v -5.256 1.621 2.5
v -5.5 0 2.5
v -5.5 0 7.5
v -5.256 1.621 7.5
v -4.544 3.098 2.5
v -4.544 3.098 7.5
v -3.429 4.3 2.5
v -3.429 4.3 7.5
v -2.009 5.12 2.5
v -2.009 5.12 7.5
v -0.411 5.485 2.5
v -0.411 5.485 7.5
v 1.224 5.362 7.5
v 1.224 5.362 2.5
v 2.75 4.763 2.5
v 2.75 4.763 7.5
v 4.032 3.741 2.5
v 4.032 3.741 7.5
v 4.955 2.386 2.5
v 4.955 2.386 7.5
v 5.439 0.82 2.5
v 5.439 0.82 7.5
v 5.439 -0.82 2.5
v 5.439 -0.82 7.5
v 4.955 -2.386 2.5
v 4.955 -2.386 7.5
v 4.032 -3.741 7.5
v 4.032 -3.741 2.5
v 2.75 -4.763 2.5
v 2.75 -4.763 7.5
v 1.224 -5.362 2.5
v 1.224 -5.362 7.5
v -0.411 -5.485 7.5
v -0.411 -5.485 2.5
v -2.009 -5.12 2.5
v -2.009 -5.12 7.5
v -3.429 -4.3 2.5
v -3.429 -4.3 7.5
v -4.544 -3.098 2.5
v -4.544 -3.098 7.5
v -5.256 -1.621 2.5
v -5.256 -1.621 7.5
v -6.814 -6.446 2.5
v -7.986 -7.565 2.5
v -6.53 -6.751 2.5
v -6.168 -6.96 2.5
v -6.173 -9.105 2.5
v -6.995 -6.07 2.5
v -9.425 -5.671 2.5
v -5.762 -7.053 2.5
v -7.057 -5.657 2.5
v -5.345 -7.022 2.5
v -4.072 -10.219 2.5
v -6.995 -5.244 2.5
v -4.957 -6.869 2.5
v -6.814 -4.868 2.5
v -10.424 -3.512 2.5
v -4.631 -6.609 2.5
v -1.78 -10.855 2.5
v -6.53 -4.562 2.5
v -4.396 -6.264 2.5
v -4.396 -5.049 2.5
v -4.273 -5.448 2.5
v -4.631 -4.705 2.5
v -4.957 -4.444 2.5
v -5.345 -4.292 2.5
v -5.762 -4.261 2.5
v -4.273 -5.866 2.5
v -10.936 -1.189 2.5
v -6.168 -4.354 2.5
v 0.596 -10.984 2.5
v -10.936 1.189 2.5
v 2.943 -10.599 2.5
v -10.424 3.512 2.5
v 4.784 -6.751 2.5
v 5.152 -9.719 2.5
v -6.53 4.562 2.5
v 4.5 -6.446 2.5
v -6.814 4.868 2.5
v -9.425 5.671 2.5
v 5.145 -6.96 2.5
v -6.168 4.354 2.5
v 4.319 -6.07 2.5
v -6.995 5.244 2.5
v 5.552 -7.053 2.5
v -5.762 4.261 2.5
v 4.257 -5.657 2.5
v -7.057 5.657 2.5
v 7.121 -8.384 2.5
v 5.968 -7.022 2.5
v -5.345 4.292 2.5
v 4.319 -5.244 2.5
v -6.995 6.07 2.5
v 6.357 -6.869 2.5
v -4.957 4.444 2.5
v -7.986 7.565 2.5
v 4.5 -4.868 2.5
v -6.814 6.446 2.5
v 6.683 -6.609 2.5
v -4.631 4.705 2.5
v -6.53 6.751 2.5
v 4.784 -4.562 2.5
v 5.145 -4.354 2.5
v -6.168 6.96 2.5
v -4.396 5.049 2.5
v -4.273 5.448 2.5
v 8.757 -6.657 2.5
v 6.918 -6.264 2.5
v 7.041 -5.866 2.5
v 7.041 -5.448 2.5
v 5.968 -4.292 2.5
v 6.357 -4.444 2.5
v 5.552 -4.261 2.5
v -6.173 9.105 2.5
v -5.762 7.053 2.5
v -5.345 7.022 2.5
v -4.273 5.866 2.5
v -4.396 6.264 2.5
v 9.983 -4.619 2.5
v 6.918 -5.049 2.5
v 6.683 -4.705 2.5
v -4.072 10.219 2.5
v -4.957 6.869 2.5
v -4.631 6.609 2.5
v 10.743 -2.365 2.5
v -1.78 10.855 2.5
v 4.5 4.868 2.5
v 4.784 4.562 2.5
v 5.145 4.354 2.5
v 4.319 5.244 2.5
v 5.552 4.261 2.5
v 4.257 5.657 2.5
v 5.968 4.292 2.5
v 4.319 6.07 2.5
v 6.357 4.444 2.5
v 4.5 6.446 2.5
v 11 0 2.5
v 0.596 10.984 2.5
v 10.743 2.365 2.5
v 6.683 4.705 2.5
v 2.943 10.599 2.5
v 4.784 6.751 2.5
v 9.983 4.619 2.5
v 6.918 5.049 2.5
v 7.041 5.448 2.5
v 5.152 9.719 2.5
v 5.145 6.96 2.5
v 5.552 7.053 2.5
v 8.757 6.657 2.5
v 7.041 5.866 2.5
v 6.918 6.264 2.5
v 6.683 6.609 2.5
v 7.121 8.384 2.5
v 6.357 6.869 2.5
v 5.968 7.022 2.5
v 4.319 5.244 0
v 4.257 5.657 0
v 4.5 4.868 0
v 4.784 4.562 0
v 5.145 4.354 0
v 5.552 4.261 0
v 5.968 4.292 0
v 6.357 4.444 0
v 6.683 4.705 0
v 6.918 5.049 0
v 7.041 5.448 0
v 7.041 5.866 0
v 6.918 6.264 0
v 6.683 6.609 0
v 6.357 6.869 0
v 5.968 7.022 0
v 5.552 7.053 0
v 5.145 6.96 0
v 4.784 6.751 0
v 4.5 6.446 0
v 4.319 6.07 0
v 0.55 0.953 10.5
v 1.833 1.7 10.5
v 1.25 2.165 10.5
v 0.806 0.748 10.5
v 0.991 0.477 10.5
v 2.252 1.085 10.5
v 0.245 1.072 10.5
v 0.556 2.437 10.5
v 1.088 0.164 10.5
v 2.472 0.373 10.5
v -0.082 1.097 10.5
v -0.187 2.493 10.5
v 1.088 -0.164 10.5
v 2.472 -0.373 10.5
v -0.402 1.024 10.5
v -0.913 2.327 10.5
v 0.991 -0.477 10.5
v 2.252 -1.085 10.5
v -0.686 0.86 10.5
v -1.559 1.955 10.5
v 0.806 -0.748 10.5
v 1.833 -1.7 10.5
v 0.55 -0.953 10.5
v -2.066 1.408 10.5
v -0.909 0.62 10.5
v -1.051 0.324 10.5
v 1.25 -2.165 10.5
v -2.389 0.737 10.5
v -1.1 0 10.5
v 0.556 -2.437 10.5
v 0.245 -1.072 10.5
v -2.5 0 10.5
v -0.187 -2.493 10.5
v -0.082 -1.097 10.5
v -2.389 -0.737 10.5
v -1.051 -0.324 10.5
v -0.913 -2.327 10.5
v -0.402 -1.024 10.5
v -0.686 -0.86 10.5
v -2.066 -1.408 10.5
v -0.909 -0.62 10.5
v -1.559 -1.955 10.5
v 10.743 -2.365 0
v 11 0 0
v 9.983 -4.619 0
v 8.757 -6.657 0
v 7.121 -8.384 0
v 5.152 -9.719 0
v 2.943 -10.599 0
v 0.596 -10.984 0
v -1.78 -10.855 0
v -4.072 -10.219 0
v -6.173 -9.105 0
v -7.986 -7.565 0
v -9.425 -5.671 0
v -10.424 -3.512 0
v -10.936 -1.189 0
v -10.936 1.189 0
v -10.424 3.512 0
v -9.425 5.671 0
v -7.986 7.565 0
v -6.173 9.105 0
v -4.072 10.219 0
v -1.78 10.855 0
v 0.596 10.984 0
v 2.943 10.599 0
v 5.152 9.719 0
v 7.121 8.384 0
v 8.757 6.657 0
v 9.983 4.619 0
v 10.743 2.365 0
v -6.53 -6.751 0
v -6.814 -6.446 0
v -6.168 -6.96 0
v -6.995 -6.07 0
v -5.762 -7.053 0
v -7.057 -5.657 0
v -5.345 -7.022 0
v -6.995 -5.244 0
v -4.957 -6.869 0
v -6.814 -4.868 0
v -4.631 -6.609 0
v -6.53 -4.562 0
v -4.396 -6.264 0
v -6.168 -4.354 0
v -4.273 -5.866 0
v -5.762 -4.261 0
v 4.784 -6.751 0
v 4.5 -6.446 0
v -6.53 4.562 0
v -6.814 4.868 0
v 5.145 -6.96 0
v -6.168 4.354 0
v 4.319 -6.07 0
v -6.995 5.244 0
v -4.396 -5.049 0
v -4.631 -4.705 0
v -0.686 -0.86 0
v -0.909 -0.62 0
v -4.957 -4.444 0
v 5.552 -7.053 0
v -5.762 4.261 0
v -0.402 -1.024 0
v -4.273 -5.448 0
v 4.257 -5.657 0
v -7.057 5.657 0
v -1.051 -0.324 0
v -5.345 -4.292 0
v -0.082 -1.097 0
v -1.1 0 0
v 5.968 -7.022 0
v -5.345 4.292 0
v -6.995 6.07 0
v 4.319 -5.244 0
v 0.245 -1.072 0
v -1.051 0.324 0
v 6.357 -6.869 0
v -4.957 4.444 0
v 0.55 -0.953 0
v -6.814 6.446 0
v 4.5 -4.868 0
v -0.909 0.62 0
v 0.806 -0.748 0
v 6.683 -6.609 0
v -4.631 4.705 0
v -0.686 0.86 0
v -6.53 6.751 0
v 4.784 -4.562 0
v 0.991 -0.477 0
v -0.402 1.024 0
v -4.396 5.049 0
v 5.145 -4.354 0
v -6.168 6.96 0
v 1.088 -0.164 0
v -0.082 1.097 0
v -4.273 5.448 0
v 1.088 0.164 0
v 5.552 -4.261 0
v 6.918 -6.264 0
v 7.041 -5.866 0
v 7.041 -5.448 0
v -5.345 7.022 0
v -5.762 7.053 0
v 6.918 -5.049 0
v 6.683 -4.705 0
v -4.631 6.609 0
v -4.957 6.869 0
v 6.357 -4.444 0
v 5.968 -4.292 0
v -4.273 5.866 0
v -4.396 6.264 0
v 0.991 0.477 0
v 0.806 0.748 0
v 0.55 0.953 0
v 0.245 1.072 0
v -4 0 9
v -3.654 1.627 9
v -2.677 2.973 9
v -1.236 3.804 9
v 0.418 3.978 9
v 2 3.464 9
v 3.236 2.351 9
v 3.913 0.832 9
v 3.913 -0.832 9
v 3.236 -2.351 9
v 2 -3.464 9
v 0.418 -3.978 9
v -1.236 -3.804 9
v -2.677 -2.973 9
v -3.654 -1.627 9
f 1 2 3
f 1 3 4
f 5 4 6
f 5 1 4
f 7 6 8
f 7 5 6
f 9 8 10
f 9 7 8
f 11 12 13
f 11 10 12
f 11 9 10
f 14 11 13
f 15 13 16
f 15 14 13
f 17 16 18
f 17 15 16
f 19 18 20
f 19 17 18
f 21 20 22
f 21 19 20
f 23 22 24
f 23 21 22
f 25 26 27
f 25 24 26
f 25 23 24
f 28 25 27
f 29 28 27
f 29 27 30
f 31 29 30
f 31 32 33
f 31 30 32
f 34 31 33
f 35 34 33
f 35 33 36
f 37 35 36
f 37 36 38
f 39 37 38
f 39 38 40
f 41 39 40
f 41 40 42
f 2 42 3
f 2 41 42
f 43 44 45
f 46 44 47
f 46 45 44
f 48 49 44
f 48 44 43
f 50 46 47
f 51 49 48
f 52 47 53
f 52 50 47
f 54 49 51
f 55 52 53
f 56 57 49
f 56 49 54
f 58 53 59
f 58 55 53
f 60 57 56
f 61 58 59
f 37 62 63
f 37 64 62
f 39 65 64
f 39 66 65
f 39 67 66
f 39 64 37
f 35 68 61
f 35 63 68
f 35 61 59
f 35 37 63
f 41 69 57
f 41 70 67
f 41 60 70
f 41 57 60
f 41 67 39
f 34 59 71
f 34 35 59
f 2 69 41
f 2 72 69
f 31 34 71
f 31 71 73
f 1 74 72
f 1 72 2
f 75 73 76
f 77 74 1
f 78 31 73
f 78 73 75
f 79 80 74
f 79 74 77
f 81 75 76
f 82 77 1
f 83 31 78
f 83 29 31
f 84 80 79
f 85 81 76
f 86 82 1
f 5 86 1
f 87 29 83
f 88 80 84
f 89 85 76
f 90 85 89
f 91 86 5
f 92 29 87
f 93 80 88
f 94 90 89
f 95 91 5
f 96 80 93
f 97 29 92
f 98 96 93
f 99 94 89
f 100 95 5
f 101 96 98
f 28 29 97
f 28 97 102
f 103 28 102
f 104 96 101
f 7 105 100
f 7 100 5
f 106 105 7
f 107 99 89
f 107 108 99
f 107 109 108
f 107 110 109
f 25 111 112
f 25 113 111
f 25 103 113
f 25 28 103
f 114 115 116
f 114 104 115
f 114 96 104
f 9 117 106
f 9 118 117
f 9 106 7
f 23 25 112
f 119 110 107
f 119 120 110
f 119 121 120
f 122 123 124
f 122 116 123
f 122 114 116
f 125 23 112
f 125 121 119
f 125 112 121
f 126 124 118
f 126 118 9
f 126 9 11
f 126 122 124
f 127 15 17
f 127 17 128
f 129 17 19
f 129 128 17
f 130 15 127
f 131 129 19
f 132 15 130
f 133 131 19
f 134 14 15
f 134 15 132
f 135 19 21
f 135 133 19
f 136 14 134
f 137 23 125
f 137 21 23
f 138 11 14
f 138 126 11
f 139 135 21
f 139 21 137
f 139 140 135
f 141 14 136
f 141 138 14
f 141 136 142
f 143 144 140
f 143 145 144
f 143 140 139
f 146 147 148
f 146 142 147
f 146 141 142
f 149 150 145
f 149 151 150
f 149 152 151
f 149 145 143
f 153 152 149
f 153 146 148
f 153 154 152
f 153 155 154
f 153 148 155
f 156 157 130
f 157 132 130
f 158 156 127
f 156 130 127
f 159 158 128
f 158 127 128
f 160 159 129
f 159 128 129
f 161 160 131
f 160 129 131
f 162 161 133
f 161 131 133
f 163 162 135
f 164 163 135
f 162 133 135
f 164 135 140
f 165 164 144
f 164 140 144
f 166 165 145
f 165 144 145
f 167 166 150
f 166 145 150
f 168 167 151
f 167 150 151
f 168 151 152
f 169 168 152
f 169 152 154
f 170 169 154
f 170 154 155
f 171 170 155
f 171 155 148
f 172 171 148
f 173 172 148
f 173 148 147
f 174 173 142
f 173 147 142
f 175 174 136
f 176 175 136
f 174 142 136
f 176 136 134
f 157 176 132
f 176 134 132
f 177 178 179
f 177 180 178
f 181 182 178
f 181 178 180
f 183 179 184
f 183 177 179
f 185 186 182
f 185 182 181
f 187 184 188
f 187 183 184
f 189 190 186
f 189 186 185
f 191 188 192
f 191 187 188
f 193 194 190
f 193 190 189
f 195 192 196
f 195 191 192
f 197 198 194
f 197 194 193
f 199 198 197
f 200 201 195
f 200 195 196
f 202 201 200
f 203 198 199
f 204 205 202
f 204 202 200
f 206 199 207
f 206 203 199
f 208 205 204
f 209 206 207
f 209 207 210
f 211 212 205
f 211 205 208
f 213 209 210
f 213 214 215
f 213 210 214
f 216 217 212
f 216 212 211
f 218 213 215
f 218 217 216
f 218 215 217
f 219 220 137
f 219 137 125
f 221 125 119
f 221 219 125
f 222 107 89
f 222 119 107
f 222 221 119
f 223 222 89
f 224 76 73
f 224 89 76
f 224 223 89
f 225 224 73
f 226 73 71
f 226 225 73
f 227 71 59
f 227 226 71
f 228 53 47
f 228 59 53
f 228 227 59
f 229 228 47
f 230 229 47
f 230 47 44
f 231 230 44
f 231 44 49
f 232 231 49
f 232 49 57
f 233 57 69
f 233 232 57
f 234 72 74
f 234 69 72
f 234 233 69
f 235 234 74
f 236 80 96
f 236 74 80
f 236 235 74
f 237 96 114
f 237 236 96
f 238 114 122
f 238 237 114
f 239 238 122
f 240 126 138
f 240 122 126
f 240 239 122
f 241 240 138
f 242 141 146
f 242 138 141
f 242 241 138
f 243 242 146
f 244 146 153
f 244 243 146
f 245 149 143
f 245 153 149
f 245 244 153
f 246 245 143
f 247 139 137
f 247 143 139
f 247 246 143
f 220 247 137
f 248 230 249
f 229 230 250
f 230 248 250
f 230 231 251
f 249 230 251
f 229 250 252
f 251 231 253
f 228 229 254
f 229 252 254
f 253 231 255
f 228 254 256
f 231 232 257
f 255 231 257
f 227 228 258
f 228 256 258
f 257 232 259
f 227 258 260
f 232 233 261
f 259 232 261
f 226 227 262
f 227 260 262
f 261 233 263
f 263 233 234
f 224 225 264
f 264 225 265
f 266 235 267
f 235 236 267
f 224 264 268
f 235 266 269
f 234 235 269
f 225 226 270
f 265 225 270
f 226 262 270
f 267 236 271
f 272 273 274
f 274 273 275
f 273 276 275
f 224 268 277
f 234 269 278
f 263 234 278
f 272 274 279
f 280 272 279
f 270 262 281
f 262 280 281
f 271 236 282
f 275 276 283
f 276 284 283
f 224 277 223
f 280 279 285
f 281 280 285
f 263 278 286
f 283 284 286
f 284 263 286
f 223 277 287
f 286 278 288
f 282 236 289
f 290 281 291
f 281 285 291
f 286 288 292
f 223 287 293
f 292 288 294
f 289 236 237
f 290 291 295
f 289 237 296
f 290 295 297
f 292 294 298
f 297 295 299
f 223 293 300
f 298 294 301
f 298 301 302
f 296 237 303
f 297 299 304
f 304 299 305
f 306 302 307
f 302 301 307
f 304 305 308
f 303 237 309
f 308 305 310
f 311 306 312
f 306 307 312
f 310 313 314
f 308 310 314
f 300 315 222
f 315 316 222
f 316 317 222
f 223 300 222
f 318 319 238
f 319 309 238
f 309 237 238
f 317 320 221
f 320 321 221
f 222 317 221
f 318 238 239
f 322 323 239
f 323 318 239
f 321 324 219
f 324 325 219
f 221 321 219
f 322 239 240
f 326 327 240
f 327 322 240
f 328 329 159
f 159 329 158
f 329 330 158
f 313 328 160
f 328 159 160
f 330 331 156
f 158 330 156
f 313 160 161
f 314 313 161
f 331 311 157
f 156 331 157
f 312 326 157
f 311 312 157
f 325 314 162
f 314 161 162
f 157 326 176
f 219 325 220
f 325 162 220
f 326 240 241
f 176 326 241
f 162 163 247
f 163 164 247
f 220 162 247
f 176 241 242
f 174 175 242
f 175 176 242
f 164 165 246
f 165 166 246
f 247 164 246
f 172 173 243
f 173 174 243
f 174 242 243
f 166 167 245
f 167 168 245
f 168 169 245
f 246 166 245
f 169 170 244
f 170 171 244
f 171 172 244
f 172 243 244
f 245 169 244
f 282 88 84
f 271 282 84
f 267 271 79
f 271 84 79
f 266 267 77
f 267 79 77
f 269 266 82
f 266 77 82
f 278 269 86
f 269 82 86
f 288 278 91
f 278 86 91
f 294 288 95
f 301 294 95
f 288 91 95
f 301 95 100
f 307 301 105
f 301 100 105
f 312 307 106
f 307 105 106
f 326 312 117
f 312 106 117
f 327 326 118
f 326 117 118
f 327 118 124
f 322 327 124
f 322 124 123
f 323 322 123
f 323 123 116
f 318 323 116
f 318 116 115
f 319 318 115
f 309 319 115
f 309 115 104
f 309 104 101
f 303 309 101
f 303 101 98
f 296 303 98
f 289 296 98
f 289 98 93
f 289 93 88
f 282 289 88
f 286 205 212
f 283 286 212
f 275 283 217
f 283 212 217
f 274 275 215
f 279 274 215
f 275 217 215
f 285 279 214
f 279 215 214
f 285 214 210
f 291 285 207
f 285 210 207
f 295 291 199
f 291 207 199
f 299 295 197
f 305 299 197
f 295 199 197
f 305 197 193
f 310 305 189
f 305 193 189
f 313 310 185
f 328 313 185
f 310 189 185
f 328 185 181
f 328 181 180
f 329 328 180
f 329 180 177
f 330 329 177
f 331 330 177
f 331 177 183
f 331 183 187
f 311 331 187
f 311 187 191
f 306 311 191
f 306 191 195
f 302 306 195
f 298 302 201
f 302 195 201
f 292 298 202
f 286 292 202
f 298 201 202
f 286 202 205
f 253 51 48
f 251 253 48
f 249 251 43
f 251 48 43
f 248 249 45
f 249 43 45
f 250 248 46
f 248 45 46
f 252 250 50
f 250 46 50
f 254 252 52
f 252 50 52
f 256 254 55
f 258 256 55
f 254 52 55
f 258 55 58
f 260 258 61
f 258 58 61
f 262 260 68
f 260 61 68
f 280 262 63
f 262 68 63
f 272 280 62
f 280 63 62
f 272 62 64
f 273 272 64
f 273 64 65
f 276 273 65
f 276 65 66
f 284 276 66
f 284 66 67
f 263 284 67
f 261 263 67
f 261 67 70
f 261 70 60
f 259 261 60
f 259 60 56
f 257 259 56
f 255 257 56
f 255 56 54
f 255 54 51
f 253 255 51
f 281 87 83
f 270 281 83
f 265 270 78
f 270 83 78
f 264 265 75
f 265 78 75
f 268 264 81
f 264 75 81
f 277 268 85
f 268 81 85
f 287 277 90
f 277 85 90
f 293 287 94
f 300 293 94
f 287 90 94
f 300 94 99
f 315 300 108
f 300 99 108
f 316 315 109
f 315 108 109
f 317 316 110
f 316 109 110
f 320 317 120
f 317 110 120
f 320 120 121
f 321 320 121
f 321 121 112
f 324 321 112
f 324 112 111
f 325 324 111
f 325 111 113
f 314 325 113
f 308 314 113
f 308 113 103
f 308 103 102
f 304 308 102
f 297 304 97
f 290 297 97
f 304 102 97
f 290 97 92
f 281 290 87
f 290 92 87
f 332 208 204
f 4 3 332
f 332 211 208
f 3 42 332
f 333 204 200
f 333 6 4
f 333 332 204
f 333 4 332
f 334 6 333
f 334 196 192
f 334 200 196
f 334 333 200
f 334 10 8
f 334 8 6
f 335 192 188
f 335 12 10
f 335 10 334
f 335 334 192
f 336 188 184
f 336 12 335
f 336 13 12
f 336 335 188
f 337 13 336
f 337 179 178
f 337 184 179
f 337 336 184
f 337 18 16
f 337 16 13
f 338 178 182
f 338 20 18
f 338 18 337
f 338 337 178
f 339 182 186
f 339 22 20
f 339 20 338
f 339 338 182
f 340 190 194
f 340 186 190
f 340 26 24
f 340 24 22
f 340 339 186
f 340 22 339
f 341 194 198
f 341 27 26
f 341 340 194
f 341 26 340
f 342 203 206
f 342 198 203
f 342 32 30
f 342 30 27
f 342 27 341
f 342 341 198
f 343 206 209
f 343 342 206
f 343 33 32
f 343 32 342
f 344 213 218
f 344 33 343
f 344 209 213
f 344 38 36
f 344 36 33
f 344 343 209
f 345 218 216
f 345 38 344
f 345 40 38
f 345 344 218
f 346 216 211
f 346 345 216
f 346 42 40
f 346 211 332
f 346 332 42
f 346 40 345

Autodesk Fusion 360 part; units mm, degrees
sketch "Sketch1" plane through (0, 0, 0) normal (0, 0, 1) x (1, 0, 0)
  circle A0 centre (0, 0) radius 11
  dimension "d1" = 22
extrude "Extrude1" add sketch "Sketch1" along normal blind 2.5
sketch "Sketch2" plane through (0, 0, 2.5) normal (0, 0, 1) x (-1, 0, 0)
  circle A0 centre (0, 0) radius 11
  circle A1 centre (0, 0) radius 5.5
  dimension "d4" = 11
extrude "Extrude2" add sketch "Sketch2" along normal blind 8 contours A1
sketch "Sketch3" plane through (0, 0, 2.5) normal (0, 0, 1) x (-1, 0, 0)
  circle A0 centre (0, 0) radius 5.5
  circle A1 centre (0, 0) radius 11
  circle A2 centre (5.6569, -5.6569) radius 1.4
  circle A3 centre (5.6569, 5.6569) radius 1.4
  circle A4 centre (-5.6569, 5.6569) radius 1.4
  circle A5 centre (-5.6569, -5.6569) radius 1.4
  line L0 (0, 0) -> (7.7782, -7.7782) construction
  line L1 (0, 0) -> (11, 0) construction
  dimension "d7" = 2.8
  dimension "d8" = 8
  dimension "d10" = 360
  dimension "d27" = 45
extrude "Extrude3" cut sketch "Sketch3" against normal through all contours A2 | A3 | A4 | A5
sketch "Sketch4" plane through (0, 0, 10.5) normal (0, 0, 1) x (-1, 0, 0)
  circle A0 centre (0, 0) radius 5.5
  circle A1 centre (0, 0) radius 1.1
  dimension "d12" = 2.2
extrude "Extrude4" cut sketch "Sketch4" against normal through all contours A1
chamfer "Chamfer1" distance 3 angle 45 1 edges at (5.1278, 1.9889, 10.5)
